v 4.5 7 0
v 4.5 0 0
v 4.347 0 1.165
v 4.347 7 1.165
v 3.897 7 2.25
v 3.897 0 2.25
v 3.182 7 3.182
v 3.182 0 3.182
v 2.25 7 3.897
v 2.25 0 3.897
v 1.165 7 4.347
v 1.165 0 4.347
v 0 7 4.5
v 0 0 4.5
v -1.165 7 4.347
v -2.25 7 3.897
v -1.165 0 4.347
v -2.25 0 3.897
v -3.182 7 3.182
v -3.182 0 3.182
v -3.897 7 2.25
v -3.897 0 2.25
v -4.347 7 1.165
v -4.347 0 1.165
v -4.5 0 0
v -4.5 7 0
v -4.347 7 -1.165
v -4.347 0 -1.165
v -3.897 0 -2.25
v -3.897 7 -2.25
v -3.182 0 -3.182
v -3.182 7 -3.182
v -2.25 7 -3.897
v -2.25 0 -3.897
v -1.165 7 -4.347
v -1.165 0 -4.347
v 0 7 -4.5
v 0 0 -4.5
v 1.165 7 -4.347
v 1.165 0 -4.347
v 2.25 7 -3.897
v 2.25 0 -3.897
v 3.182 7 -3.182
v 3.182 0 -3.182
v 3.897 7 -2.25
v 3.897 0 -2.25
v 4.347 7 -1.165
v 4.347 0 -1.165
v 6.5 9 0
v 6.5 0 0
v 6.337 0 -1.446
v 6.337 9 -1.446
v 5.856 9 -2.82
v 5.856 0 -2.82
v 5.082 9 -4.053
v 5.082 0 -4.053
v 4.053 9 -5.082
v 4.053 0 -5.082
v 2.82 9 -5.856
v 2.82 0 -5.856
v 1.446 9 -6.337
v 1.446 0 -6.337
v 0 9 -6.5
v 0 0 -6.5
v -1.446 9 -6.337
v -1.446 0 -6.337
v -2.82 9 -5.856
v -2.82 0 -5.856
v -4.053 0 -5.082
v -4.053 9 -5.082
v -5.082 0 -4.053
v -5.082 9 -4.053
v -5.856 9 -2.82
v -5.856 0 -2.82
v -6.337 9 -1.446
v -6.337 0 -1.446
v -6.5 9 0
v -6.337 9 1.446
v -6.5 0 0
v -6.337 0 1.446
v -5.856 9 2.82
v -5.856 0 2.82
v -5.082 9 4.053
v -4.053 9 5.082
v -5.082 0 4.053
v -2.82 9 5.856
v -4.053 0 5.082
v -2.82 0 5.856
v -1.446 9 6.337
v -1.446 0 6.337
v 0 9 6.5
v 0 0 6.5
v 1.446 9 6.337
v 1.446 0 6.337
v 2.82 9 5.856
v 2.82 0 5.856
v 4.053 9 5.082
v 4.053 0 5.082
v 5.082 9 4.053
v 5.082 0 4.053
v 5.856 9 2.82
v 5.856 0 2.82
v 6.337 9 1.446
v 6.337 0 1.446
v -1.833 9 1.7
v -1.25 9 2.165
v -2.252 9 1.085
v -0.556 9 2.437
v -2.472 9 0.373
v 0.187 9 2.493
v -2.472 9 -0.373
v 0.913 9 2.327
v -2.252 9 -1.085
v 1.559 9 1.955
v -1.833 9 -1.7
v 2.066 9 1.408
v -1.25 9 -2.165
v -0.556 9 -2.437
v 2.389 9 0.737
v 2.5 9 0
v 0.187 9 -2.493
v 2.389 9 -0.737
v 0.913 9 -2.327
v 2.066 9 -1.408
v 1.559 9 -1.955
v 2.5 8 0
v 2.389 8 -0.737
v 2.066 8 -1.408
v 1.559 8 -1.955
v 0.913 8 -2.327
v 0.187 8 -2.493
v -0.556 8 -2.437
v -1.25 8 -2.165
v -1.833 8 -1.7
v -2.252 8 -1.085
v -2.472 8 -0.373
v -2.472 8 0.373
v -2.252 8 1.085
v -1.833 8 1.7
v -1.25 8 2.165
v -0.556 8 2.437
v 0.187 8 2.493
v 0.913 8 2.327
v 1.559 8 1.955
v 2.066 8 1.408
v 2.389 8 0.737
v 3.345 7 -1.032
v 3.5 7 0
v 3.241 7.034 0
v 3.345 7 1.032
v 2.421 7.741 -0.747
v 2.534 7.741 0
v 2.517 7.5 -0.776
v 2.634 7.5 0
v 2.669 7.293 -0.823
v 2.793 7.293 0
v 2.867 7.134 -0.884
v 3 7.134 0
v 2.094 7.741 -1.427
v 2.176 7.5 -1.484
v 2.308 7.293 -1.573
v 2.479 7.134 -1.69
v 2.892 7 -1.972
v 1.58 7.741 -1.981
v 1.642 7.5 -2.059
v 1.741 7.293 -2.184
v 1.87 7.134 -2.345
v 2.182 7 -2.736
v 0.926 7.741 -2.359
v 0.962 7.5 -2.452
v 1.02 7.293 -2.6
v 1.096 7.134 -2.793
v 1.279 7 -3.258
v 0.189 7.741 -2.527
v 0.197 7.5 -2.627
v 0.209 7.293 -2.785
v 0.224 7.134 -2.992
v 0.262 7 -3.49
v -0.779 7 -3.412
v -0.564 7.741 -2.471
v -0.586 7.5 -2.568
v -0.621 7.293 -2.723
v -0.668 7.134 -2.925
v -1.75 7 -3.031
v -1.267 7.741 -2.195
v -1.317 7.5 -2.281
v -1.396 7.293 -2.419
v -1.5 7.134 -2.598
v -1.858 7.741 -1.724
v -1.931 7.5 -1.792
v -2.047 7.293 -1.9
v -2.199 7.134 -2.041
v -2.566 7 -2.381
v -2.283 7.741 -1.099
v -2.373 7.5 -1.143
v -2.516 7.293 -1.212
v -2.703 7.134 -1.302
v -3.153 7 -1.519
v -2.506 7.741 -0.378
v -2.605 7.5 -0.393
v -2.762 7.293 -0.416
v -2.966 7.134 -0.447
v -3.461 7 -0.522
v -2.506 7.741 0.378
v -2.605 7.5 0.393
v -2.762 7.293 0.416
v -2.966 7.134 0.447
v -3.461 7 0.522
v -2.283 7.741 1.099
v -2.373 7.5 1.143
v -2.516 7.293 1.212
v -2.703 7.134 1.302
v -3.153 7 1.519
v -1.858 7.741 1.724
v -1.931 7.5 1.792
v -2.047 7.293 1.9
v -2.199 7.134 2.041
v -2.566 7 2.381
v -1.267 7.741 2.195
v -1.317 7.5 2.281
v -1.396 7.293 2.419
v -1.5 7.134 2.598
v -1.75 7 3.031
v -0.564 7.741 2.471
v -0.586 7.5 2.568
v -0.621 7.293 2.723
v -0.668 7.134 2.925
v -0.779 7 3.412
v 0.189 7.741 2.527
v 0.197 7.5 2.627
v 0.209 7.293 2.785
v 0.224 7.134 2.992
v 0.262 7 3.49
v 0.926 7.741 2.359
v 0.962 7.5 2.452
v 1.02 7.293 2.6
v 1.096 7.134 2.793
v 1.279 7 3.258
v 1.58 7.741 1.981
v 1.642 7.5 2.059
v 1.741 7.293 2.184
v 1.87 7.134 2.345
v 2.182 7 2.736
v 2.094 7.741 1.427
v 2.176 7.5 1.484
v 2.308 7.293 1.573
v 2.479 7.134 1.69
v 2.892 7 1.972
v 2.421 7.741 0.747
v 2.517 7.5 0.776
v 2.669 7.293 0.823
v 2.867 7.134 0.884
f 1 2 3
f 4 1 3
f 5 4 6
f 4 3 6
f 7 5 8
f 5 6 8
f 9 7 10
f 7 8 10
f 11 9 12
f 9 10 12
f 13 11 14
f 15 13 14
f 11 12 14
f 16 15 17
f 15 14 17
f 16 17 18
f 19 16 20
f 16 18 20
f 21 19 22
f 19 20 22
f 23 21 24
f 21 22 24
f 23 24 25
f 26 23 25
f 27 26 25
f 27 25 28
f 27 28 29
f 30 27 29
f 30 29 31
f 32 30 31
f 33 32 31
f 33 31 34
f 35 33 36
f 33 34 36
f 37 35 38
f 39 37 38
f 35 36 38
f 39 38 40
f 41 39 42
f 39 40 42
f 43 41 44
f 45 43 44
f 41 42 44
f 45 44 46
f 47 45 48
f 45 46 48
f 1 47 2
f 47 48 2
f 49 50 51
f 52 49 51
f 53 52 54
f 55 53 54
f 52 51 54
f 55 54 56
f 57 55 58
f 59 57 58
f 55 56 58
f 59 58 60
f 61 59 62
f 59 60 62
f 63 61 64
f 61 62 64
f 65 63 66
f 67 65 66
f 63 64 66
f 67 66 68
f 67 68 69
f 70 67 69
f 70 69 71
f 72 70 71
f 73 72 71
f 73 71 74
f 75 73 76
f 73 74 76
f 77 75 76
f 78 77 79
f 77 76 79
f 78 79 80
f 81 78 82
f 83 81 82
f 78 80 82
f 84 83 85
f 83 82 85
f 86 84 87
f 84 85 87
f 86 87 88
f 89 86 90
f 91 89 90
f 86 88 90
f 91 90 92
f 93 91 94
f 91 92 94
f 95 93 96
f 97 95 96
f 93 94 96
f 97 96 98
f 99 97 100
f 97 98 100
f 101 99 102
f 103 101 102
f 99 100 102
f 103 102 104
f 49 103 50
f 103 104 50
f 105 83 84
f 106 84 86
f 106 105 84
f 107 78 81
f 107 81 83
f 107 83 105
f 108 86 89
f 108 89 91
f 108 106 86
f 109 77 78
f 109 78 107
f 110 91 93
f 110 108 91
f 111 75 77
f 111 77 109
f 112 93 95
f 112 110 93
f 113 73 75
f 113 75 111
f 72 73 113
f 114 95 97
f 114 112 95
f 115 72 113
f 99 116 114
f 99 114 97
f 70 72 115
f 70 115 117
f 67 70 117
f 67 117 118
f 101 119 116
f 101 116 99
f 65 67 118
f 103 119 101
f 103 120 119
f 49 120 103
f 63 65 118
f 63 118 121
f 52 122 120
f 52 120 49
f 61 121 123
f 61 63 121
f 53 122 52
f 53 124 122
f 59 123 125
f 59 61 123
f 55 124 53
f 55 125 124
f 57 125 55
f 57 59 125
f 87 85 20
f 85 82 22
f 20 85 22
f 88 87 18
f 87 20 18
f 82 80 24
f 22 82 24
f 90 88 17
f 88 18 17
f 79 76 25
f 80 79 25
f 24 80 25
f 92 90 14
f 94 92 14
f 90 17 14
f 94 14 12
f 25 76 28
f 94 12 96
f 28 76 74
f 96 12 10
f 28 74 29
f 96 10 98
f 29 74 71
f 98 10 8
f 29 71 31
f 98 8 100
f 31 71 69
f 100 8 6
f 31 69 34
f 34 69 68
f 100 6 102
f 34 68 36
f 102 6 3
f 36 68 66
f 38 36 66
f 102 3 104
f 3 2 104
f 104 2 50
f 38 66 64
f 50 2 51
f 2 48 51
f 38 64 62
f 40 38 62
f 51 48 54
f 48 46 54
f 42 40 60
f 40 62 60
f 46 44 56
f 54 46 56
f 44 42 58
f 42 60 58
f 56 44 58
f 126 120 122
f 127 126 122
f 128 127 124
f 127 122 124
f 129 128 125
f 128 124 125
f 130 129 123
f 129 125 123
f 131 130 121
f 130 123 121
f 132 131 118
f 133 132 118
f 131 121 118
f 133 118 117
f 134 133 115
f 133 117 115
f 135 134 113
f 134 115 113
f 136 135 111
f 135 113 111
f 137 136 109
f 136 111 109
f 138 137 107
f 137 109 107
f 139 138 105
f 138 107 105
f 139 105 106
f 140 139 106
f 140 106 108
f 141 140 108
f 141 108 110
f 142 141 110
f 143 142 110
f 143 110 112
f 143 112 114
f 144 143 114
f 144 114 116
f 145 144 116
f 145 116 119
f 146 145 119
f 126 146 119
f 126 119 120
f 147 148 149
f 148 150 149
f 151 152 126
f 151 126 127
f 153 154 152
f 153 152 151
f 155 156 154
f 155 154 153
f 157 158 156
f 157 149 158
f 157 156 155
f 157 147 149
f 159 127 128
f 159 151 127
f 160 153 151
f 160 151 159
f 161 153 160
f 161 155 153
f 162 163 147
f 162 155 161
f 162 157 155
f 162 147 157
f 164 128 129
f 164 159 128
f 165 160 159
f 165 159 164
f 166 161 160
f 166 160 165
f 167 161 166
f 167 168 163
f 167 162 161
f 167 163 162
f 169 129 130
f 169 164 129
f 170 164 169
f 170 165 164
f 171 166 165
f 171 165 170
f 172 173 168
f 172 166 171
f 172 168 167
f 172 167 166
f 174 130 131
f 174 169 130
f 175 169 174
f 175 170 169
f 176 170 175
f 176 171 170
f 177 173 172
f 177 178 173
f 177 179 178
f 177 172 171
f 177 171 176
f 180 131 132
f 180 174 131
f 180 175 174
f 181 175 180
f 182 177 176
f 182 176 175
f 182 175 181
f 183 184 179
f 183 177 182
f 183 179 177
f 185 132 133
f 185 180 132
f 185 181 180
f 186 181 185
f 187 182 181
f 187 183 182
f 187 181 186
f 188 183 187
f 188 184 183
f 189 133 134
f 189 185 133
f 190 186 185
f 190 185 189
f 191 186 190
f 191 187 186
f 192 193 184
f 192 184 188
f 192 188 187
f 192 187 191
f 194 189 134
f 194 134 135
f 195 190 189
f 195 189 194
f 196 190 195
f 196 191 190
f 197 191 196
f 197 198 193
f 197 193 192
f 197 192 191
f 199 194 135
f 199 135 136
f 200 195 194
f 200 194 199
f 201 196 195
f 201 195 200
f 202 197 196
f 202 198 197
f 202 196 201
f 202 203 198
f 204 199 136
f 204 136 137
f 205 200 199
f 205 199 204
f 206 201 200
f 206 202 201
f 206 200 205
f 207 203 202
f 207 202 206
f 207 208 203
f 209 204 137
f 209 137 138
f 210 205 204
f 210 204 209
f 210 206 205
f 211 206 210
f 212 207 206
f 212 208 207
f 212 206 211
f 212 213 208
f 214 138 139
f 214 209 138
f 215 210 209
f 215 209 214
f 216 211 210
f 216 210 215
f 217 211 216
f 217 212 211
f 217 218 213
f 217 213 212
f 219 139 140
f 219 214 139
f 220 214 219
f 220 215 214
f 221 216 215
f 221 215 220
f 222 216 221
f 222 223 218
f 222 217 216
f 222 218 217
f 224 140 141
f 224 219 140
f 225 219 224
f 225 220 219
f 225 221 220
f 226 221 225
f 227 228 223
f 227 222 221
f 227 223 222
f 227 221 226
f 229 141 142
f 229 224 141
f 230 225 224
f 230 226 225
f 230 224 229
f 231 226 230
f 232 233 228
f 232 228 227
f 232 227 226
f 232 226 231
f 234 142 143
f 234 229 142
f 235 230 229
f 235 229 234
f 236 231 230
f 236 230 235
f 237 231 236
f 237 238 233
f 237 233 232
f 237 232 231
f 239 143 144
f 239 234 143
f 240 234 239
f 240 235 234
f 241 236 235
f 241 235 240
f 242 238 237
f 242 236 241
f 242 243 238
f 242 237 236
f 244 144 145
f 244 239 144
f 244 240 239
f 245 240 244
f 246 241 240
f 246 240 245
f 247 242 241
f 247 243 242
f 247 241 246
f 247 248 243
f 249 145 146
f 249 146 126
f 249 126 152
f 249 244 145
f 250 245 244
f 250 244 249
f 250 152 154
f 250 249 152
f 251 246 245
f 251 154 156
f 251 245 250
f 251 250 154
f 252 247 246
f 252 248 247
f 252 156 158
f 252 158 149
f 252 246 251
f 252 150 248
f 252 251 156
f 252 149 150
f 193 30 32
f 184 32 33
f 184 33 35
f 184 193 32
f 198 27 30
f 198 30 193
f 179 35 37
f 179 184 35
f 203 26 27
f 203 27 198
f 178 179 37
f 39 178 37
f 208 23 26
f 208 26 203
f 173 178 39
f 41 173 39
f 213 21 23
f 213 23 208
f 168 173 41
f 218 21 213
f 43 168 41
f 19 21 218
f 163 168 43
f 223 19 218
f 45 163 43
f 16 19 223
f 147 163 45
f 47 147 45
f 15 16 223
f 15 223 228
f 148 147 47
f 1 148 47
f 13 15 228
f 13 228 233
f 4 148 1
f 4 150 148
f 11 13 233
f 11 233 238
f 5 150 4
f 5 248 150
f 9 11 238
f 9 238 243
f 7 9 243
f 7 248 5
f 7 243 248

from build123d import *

# Parameters (mm, degrees)
SKETCH1_R           = 6.5
BOSS_EXTRUDE1_DEPTH = 9
SKETCH3_R           = 4.5
CUT_EXTRUDE1_DEPTH  = 7
SKETCH2_R           = 2.5
CUT_EXTRUDE2_DEPTH  = 3
FILLET2_R           = 1


with BuildPart() as part:
    # Sketch1 → Boss-Extrude1 (new body)
    with BuildSketch(Plane(origin=(0, 0, 0), x_dir=(1, 0, 0), z_dir=(0, 1, 0))):
        Circle(SKETCH1_R)
    extrude(amount=BOSS_EXTRUDE1_DEPTH)

    # Sketch3 → Cut-Extrude1 (cut)
    with BuildSketch(Plane.XZ):
        Circle(SKETCH3_R)
    extrude(amount=-CUT_EXTRUDE1_DEPTH, mode=Mode.SUBTRACT)

    # Sketch2 → Cut-Extrude2 (cut)
    with BuildSketch(Plane(origin=(0, 9, 0), x_dir=(1, 0, 0), z_dir=(0, 1, 0))):
        Circle(SKETCH2_R)
    extrude(amount=-CUT_EXTRUDE2_DEPTH, mode=Mode.SUBTRACT)

    # Fillet2
    fillet2_edges = [part.edges().sort_by_distance(p)[0] for p in [
        (-2.5, 7, 0),
    ]]
    fillet(fillet2_edges, radius=FILLET2_R)


solid = part.part
